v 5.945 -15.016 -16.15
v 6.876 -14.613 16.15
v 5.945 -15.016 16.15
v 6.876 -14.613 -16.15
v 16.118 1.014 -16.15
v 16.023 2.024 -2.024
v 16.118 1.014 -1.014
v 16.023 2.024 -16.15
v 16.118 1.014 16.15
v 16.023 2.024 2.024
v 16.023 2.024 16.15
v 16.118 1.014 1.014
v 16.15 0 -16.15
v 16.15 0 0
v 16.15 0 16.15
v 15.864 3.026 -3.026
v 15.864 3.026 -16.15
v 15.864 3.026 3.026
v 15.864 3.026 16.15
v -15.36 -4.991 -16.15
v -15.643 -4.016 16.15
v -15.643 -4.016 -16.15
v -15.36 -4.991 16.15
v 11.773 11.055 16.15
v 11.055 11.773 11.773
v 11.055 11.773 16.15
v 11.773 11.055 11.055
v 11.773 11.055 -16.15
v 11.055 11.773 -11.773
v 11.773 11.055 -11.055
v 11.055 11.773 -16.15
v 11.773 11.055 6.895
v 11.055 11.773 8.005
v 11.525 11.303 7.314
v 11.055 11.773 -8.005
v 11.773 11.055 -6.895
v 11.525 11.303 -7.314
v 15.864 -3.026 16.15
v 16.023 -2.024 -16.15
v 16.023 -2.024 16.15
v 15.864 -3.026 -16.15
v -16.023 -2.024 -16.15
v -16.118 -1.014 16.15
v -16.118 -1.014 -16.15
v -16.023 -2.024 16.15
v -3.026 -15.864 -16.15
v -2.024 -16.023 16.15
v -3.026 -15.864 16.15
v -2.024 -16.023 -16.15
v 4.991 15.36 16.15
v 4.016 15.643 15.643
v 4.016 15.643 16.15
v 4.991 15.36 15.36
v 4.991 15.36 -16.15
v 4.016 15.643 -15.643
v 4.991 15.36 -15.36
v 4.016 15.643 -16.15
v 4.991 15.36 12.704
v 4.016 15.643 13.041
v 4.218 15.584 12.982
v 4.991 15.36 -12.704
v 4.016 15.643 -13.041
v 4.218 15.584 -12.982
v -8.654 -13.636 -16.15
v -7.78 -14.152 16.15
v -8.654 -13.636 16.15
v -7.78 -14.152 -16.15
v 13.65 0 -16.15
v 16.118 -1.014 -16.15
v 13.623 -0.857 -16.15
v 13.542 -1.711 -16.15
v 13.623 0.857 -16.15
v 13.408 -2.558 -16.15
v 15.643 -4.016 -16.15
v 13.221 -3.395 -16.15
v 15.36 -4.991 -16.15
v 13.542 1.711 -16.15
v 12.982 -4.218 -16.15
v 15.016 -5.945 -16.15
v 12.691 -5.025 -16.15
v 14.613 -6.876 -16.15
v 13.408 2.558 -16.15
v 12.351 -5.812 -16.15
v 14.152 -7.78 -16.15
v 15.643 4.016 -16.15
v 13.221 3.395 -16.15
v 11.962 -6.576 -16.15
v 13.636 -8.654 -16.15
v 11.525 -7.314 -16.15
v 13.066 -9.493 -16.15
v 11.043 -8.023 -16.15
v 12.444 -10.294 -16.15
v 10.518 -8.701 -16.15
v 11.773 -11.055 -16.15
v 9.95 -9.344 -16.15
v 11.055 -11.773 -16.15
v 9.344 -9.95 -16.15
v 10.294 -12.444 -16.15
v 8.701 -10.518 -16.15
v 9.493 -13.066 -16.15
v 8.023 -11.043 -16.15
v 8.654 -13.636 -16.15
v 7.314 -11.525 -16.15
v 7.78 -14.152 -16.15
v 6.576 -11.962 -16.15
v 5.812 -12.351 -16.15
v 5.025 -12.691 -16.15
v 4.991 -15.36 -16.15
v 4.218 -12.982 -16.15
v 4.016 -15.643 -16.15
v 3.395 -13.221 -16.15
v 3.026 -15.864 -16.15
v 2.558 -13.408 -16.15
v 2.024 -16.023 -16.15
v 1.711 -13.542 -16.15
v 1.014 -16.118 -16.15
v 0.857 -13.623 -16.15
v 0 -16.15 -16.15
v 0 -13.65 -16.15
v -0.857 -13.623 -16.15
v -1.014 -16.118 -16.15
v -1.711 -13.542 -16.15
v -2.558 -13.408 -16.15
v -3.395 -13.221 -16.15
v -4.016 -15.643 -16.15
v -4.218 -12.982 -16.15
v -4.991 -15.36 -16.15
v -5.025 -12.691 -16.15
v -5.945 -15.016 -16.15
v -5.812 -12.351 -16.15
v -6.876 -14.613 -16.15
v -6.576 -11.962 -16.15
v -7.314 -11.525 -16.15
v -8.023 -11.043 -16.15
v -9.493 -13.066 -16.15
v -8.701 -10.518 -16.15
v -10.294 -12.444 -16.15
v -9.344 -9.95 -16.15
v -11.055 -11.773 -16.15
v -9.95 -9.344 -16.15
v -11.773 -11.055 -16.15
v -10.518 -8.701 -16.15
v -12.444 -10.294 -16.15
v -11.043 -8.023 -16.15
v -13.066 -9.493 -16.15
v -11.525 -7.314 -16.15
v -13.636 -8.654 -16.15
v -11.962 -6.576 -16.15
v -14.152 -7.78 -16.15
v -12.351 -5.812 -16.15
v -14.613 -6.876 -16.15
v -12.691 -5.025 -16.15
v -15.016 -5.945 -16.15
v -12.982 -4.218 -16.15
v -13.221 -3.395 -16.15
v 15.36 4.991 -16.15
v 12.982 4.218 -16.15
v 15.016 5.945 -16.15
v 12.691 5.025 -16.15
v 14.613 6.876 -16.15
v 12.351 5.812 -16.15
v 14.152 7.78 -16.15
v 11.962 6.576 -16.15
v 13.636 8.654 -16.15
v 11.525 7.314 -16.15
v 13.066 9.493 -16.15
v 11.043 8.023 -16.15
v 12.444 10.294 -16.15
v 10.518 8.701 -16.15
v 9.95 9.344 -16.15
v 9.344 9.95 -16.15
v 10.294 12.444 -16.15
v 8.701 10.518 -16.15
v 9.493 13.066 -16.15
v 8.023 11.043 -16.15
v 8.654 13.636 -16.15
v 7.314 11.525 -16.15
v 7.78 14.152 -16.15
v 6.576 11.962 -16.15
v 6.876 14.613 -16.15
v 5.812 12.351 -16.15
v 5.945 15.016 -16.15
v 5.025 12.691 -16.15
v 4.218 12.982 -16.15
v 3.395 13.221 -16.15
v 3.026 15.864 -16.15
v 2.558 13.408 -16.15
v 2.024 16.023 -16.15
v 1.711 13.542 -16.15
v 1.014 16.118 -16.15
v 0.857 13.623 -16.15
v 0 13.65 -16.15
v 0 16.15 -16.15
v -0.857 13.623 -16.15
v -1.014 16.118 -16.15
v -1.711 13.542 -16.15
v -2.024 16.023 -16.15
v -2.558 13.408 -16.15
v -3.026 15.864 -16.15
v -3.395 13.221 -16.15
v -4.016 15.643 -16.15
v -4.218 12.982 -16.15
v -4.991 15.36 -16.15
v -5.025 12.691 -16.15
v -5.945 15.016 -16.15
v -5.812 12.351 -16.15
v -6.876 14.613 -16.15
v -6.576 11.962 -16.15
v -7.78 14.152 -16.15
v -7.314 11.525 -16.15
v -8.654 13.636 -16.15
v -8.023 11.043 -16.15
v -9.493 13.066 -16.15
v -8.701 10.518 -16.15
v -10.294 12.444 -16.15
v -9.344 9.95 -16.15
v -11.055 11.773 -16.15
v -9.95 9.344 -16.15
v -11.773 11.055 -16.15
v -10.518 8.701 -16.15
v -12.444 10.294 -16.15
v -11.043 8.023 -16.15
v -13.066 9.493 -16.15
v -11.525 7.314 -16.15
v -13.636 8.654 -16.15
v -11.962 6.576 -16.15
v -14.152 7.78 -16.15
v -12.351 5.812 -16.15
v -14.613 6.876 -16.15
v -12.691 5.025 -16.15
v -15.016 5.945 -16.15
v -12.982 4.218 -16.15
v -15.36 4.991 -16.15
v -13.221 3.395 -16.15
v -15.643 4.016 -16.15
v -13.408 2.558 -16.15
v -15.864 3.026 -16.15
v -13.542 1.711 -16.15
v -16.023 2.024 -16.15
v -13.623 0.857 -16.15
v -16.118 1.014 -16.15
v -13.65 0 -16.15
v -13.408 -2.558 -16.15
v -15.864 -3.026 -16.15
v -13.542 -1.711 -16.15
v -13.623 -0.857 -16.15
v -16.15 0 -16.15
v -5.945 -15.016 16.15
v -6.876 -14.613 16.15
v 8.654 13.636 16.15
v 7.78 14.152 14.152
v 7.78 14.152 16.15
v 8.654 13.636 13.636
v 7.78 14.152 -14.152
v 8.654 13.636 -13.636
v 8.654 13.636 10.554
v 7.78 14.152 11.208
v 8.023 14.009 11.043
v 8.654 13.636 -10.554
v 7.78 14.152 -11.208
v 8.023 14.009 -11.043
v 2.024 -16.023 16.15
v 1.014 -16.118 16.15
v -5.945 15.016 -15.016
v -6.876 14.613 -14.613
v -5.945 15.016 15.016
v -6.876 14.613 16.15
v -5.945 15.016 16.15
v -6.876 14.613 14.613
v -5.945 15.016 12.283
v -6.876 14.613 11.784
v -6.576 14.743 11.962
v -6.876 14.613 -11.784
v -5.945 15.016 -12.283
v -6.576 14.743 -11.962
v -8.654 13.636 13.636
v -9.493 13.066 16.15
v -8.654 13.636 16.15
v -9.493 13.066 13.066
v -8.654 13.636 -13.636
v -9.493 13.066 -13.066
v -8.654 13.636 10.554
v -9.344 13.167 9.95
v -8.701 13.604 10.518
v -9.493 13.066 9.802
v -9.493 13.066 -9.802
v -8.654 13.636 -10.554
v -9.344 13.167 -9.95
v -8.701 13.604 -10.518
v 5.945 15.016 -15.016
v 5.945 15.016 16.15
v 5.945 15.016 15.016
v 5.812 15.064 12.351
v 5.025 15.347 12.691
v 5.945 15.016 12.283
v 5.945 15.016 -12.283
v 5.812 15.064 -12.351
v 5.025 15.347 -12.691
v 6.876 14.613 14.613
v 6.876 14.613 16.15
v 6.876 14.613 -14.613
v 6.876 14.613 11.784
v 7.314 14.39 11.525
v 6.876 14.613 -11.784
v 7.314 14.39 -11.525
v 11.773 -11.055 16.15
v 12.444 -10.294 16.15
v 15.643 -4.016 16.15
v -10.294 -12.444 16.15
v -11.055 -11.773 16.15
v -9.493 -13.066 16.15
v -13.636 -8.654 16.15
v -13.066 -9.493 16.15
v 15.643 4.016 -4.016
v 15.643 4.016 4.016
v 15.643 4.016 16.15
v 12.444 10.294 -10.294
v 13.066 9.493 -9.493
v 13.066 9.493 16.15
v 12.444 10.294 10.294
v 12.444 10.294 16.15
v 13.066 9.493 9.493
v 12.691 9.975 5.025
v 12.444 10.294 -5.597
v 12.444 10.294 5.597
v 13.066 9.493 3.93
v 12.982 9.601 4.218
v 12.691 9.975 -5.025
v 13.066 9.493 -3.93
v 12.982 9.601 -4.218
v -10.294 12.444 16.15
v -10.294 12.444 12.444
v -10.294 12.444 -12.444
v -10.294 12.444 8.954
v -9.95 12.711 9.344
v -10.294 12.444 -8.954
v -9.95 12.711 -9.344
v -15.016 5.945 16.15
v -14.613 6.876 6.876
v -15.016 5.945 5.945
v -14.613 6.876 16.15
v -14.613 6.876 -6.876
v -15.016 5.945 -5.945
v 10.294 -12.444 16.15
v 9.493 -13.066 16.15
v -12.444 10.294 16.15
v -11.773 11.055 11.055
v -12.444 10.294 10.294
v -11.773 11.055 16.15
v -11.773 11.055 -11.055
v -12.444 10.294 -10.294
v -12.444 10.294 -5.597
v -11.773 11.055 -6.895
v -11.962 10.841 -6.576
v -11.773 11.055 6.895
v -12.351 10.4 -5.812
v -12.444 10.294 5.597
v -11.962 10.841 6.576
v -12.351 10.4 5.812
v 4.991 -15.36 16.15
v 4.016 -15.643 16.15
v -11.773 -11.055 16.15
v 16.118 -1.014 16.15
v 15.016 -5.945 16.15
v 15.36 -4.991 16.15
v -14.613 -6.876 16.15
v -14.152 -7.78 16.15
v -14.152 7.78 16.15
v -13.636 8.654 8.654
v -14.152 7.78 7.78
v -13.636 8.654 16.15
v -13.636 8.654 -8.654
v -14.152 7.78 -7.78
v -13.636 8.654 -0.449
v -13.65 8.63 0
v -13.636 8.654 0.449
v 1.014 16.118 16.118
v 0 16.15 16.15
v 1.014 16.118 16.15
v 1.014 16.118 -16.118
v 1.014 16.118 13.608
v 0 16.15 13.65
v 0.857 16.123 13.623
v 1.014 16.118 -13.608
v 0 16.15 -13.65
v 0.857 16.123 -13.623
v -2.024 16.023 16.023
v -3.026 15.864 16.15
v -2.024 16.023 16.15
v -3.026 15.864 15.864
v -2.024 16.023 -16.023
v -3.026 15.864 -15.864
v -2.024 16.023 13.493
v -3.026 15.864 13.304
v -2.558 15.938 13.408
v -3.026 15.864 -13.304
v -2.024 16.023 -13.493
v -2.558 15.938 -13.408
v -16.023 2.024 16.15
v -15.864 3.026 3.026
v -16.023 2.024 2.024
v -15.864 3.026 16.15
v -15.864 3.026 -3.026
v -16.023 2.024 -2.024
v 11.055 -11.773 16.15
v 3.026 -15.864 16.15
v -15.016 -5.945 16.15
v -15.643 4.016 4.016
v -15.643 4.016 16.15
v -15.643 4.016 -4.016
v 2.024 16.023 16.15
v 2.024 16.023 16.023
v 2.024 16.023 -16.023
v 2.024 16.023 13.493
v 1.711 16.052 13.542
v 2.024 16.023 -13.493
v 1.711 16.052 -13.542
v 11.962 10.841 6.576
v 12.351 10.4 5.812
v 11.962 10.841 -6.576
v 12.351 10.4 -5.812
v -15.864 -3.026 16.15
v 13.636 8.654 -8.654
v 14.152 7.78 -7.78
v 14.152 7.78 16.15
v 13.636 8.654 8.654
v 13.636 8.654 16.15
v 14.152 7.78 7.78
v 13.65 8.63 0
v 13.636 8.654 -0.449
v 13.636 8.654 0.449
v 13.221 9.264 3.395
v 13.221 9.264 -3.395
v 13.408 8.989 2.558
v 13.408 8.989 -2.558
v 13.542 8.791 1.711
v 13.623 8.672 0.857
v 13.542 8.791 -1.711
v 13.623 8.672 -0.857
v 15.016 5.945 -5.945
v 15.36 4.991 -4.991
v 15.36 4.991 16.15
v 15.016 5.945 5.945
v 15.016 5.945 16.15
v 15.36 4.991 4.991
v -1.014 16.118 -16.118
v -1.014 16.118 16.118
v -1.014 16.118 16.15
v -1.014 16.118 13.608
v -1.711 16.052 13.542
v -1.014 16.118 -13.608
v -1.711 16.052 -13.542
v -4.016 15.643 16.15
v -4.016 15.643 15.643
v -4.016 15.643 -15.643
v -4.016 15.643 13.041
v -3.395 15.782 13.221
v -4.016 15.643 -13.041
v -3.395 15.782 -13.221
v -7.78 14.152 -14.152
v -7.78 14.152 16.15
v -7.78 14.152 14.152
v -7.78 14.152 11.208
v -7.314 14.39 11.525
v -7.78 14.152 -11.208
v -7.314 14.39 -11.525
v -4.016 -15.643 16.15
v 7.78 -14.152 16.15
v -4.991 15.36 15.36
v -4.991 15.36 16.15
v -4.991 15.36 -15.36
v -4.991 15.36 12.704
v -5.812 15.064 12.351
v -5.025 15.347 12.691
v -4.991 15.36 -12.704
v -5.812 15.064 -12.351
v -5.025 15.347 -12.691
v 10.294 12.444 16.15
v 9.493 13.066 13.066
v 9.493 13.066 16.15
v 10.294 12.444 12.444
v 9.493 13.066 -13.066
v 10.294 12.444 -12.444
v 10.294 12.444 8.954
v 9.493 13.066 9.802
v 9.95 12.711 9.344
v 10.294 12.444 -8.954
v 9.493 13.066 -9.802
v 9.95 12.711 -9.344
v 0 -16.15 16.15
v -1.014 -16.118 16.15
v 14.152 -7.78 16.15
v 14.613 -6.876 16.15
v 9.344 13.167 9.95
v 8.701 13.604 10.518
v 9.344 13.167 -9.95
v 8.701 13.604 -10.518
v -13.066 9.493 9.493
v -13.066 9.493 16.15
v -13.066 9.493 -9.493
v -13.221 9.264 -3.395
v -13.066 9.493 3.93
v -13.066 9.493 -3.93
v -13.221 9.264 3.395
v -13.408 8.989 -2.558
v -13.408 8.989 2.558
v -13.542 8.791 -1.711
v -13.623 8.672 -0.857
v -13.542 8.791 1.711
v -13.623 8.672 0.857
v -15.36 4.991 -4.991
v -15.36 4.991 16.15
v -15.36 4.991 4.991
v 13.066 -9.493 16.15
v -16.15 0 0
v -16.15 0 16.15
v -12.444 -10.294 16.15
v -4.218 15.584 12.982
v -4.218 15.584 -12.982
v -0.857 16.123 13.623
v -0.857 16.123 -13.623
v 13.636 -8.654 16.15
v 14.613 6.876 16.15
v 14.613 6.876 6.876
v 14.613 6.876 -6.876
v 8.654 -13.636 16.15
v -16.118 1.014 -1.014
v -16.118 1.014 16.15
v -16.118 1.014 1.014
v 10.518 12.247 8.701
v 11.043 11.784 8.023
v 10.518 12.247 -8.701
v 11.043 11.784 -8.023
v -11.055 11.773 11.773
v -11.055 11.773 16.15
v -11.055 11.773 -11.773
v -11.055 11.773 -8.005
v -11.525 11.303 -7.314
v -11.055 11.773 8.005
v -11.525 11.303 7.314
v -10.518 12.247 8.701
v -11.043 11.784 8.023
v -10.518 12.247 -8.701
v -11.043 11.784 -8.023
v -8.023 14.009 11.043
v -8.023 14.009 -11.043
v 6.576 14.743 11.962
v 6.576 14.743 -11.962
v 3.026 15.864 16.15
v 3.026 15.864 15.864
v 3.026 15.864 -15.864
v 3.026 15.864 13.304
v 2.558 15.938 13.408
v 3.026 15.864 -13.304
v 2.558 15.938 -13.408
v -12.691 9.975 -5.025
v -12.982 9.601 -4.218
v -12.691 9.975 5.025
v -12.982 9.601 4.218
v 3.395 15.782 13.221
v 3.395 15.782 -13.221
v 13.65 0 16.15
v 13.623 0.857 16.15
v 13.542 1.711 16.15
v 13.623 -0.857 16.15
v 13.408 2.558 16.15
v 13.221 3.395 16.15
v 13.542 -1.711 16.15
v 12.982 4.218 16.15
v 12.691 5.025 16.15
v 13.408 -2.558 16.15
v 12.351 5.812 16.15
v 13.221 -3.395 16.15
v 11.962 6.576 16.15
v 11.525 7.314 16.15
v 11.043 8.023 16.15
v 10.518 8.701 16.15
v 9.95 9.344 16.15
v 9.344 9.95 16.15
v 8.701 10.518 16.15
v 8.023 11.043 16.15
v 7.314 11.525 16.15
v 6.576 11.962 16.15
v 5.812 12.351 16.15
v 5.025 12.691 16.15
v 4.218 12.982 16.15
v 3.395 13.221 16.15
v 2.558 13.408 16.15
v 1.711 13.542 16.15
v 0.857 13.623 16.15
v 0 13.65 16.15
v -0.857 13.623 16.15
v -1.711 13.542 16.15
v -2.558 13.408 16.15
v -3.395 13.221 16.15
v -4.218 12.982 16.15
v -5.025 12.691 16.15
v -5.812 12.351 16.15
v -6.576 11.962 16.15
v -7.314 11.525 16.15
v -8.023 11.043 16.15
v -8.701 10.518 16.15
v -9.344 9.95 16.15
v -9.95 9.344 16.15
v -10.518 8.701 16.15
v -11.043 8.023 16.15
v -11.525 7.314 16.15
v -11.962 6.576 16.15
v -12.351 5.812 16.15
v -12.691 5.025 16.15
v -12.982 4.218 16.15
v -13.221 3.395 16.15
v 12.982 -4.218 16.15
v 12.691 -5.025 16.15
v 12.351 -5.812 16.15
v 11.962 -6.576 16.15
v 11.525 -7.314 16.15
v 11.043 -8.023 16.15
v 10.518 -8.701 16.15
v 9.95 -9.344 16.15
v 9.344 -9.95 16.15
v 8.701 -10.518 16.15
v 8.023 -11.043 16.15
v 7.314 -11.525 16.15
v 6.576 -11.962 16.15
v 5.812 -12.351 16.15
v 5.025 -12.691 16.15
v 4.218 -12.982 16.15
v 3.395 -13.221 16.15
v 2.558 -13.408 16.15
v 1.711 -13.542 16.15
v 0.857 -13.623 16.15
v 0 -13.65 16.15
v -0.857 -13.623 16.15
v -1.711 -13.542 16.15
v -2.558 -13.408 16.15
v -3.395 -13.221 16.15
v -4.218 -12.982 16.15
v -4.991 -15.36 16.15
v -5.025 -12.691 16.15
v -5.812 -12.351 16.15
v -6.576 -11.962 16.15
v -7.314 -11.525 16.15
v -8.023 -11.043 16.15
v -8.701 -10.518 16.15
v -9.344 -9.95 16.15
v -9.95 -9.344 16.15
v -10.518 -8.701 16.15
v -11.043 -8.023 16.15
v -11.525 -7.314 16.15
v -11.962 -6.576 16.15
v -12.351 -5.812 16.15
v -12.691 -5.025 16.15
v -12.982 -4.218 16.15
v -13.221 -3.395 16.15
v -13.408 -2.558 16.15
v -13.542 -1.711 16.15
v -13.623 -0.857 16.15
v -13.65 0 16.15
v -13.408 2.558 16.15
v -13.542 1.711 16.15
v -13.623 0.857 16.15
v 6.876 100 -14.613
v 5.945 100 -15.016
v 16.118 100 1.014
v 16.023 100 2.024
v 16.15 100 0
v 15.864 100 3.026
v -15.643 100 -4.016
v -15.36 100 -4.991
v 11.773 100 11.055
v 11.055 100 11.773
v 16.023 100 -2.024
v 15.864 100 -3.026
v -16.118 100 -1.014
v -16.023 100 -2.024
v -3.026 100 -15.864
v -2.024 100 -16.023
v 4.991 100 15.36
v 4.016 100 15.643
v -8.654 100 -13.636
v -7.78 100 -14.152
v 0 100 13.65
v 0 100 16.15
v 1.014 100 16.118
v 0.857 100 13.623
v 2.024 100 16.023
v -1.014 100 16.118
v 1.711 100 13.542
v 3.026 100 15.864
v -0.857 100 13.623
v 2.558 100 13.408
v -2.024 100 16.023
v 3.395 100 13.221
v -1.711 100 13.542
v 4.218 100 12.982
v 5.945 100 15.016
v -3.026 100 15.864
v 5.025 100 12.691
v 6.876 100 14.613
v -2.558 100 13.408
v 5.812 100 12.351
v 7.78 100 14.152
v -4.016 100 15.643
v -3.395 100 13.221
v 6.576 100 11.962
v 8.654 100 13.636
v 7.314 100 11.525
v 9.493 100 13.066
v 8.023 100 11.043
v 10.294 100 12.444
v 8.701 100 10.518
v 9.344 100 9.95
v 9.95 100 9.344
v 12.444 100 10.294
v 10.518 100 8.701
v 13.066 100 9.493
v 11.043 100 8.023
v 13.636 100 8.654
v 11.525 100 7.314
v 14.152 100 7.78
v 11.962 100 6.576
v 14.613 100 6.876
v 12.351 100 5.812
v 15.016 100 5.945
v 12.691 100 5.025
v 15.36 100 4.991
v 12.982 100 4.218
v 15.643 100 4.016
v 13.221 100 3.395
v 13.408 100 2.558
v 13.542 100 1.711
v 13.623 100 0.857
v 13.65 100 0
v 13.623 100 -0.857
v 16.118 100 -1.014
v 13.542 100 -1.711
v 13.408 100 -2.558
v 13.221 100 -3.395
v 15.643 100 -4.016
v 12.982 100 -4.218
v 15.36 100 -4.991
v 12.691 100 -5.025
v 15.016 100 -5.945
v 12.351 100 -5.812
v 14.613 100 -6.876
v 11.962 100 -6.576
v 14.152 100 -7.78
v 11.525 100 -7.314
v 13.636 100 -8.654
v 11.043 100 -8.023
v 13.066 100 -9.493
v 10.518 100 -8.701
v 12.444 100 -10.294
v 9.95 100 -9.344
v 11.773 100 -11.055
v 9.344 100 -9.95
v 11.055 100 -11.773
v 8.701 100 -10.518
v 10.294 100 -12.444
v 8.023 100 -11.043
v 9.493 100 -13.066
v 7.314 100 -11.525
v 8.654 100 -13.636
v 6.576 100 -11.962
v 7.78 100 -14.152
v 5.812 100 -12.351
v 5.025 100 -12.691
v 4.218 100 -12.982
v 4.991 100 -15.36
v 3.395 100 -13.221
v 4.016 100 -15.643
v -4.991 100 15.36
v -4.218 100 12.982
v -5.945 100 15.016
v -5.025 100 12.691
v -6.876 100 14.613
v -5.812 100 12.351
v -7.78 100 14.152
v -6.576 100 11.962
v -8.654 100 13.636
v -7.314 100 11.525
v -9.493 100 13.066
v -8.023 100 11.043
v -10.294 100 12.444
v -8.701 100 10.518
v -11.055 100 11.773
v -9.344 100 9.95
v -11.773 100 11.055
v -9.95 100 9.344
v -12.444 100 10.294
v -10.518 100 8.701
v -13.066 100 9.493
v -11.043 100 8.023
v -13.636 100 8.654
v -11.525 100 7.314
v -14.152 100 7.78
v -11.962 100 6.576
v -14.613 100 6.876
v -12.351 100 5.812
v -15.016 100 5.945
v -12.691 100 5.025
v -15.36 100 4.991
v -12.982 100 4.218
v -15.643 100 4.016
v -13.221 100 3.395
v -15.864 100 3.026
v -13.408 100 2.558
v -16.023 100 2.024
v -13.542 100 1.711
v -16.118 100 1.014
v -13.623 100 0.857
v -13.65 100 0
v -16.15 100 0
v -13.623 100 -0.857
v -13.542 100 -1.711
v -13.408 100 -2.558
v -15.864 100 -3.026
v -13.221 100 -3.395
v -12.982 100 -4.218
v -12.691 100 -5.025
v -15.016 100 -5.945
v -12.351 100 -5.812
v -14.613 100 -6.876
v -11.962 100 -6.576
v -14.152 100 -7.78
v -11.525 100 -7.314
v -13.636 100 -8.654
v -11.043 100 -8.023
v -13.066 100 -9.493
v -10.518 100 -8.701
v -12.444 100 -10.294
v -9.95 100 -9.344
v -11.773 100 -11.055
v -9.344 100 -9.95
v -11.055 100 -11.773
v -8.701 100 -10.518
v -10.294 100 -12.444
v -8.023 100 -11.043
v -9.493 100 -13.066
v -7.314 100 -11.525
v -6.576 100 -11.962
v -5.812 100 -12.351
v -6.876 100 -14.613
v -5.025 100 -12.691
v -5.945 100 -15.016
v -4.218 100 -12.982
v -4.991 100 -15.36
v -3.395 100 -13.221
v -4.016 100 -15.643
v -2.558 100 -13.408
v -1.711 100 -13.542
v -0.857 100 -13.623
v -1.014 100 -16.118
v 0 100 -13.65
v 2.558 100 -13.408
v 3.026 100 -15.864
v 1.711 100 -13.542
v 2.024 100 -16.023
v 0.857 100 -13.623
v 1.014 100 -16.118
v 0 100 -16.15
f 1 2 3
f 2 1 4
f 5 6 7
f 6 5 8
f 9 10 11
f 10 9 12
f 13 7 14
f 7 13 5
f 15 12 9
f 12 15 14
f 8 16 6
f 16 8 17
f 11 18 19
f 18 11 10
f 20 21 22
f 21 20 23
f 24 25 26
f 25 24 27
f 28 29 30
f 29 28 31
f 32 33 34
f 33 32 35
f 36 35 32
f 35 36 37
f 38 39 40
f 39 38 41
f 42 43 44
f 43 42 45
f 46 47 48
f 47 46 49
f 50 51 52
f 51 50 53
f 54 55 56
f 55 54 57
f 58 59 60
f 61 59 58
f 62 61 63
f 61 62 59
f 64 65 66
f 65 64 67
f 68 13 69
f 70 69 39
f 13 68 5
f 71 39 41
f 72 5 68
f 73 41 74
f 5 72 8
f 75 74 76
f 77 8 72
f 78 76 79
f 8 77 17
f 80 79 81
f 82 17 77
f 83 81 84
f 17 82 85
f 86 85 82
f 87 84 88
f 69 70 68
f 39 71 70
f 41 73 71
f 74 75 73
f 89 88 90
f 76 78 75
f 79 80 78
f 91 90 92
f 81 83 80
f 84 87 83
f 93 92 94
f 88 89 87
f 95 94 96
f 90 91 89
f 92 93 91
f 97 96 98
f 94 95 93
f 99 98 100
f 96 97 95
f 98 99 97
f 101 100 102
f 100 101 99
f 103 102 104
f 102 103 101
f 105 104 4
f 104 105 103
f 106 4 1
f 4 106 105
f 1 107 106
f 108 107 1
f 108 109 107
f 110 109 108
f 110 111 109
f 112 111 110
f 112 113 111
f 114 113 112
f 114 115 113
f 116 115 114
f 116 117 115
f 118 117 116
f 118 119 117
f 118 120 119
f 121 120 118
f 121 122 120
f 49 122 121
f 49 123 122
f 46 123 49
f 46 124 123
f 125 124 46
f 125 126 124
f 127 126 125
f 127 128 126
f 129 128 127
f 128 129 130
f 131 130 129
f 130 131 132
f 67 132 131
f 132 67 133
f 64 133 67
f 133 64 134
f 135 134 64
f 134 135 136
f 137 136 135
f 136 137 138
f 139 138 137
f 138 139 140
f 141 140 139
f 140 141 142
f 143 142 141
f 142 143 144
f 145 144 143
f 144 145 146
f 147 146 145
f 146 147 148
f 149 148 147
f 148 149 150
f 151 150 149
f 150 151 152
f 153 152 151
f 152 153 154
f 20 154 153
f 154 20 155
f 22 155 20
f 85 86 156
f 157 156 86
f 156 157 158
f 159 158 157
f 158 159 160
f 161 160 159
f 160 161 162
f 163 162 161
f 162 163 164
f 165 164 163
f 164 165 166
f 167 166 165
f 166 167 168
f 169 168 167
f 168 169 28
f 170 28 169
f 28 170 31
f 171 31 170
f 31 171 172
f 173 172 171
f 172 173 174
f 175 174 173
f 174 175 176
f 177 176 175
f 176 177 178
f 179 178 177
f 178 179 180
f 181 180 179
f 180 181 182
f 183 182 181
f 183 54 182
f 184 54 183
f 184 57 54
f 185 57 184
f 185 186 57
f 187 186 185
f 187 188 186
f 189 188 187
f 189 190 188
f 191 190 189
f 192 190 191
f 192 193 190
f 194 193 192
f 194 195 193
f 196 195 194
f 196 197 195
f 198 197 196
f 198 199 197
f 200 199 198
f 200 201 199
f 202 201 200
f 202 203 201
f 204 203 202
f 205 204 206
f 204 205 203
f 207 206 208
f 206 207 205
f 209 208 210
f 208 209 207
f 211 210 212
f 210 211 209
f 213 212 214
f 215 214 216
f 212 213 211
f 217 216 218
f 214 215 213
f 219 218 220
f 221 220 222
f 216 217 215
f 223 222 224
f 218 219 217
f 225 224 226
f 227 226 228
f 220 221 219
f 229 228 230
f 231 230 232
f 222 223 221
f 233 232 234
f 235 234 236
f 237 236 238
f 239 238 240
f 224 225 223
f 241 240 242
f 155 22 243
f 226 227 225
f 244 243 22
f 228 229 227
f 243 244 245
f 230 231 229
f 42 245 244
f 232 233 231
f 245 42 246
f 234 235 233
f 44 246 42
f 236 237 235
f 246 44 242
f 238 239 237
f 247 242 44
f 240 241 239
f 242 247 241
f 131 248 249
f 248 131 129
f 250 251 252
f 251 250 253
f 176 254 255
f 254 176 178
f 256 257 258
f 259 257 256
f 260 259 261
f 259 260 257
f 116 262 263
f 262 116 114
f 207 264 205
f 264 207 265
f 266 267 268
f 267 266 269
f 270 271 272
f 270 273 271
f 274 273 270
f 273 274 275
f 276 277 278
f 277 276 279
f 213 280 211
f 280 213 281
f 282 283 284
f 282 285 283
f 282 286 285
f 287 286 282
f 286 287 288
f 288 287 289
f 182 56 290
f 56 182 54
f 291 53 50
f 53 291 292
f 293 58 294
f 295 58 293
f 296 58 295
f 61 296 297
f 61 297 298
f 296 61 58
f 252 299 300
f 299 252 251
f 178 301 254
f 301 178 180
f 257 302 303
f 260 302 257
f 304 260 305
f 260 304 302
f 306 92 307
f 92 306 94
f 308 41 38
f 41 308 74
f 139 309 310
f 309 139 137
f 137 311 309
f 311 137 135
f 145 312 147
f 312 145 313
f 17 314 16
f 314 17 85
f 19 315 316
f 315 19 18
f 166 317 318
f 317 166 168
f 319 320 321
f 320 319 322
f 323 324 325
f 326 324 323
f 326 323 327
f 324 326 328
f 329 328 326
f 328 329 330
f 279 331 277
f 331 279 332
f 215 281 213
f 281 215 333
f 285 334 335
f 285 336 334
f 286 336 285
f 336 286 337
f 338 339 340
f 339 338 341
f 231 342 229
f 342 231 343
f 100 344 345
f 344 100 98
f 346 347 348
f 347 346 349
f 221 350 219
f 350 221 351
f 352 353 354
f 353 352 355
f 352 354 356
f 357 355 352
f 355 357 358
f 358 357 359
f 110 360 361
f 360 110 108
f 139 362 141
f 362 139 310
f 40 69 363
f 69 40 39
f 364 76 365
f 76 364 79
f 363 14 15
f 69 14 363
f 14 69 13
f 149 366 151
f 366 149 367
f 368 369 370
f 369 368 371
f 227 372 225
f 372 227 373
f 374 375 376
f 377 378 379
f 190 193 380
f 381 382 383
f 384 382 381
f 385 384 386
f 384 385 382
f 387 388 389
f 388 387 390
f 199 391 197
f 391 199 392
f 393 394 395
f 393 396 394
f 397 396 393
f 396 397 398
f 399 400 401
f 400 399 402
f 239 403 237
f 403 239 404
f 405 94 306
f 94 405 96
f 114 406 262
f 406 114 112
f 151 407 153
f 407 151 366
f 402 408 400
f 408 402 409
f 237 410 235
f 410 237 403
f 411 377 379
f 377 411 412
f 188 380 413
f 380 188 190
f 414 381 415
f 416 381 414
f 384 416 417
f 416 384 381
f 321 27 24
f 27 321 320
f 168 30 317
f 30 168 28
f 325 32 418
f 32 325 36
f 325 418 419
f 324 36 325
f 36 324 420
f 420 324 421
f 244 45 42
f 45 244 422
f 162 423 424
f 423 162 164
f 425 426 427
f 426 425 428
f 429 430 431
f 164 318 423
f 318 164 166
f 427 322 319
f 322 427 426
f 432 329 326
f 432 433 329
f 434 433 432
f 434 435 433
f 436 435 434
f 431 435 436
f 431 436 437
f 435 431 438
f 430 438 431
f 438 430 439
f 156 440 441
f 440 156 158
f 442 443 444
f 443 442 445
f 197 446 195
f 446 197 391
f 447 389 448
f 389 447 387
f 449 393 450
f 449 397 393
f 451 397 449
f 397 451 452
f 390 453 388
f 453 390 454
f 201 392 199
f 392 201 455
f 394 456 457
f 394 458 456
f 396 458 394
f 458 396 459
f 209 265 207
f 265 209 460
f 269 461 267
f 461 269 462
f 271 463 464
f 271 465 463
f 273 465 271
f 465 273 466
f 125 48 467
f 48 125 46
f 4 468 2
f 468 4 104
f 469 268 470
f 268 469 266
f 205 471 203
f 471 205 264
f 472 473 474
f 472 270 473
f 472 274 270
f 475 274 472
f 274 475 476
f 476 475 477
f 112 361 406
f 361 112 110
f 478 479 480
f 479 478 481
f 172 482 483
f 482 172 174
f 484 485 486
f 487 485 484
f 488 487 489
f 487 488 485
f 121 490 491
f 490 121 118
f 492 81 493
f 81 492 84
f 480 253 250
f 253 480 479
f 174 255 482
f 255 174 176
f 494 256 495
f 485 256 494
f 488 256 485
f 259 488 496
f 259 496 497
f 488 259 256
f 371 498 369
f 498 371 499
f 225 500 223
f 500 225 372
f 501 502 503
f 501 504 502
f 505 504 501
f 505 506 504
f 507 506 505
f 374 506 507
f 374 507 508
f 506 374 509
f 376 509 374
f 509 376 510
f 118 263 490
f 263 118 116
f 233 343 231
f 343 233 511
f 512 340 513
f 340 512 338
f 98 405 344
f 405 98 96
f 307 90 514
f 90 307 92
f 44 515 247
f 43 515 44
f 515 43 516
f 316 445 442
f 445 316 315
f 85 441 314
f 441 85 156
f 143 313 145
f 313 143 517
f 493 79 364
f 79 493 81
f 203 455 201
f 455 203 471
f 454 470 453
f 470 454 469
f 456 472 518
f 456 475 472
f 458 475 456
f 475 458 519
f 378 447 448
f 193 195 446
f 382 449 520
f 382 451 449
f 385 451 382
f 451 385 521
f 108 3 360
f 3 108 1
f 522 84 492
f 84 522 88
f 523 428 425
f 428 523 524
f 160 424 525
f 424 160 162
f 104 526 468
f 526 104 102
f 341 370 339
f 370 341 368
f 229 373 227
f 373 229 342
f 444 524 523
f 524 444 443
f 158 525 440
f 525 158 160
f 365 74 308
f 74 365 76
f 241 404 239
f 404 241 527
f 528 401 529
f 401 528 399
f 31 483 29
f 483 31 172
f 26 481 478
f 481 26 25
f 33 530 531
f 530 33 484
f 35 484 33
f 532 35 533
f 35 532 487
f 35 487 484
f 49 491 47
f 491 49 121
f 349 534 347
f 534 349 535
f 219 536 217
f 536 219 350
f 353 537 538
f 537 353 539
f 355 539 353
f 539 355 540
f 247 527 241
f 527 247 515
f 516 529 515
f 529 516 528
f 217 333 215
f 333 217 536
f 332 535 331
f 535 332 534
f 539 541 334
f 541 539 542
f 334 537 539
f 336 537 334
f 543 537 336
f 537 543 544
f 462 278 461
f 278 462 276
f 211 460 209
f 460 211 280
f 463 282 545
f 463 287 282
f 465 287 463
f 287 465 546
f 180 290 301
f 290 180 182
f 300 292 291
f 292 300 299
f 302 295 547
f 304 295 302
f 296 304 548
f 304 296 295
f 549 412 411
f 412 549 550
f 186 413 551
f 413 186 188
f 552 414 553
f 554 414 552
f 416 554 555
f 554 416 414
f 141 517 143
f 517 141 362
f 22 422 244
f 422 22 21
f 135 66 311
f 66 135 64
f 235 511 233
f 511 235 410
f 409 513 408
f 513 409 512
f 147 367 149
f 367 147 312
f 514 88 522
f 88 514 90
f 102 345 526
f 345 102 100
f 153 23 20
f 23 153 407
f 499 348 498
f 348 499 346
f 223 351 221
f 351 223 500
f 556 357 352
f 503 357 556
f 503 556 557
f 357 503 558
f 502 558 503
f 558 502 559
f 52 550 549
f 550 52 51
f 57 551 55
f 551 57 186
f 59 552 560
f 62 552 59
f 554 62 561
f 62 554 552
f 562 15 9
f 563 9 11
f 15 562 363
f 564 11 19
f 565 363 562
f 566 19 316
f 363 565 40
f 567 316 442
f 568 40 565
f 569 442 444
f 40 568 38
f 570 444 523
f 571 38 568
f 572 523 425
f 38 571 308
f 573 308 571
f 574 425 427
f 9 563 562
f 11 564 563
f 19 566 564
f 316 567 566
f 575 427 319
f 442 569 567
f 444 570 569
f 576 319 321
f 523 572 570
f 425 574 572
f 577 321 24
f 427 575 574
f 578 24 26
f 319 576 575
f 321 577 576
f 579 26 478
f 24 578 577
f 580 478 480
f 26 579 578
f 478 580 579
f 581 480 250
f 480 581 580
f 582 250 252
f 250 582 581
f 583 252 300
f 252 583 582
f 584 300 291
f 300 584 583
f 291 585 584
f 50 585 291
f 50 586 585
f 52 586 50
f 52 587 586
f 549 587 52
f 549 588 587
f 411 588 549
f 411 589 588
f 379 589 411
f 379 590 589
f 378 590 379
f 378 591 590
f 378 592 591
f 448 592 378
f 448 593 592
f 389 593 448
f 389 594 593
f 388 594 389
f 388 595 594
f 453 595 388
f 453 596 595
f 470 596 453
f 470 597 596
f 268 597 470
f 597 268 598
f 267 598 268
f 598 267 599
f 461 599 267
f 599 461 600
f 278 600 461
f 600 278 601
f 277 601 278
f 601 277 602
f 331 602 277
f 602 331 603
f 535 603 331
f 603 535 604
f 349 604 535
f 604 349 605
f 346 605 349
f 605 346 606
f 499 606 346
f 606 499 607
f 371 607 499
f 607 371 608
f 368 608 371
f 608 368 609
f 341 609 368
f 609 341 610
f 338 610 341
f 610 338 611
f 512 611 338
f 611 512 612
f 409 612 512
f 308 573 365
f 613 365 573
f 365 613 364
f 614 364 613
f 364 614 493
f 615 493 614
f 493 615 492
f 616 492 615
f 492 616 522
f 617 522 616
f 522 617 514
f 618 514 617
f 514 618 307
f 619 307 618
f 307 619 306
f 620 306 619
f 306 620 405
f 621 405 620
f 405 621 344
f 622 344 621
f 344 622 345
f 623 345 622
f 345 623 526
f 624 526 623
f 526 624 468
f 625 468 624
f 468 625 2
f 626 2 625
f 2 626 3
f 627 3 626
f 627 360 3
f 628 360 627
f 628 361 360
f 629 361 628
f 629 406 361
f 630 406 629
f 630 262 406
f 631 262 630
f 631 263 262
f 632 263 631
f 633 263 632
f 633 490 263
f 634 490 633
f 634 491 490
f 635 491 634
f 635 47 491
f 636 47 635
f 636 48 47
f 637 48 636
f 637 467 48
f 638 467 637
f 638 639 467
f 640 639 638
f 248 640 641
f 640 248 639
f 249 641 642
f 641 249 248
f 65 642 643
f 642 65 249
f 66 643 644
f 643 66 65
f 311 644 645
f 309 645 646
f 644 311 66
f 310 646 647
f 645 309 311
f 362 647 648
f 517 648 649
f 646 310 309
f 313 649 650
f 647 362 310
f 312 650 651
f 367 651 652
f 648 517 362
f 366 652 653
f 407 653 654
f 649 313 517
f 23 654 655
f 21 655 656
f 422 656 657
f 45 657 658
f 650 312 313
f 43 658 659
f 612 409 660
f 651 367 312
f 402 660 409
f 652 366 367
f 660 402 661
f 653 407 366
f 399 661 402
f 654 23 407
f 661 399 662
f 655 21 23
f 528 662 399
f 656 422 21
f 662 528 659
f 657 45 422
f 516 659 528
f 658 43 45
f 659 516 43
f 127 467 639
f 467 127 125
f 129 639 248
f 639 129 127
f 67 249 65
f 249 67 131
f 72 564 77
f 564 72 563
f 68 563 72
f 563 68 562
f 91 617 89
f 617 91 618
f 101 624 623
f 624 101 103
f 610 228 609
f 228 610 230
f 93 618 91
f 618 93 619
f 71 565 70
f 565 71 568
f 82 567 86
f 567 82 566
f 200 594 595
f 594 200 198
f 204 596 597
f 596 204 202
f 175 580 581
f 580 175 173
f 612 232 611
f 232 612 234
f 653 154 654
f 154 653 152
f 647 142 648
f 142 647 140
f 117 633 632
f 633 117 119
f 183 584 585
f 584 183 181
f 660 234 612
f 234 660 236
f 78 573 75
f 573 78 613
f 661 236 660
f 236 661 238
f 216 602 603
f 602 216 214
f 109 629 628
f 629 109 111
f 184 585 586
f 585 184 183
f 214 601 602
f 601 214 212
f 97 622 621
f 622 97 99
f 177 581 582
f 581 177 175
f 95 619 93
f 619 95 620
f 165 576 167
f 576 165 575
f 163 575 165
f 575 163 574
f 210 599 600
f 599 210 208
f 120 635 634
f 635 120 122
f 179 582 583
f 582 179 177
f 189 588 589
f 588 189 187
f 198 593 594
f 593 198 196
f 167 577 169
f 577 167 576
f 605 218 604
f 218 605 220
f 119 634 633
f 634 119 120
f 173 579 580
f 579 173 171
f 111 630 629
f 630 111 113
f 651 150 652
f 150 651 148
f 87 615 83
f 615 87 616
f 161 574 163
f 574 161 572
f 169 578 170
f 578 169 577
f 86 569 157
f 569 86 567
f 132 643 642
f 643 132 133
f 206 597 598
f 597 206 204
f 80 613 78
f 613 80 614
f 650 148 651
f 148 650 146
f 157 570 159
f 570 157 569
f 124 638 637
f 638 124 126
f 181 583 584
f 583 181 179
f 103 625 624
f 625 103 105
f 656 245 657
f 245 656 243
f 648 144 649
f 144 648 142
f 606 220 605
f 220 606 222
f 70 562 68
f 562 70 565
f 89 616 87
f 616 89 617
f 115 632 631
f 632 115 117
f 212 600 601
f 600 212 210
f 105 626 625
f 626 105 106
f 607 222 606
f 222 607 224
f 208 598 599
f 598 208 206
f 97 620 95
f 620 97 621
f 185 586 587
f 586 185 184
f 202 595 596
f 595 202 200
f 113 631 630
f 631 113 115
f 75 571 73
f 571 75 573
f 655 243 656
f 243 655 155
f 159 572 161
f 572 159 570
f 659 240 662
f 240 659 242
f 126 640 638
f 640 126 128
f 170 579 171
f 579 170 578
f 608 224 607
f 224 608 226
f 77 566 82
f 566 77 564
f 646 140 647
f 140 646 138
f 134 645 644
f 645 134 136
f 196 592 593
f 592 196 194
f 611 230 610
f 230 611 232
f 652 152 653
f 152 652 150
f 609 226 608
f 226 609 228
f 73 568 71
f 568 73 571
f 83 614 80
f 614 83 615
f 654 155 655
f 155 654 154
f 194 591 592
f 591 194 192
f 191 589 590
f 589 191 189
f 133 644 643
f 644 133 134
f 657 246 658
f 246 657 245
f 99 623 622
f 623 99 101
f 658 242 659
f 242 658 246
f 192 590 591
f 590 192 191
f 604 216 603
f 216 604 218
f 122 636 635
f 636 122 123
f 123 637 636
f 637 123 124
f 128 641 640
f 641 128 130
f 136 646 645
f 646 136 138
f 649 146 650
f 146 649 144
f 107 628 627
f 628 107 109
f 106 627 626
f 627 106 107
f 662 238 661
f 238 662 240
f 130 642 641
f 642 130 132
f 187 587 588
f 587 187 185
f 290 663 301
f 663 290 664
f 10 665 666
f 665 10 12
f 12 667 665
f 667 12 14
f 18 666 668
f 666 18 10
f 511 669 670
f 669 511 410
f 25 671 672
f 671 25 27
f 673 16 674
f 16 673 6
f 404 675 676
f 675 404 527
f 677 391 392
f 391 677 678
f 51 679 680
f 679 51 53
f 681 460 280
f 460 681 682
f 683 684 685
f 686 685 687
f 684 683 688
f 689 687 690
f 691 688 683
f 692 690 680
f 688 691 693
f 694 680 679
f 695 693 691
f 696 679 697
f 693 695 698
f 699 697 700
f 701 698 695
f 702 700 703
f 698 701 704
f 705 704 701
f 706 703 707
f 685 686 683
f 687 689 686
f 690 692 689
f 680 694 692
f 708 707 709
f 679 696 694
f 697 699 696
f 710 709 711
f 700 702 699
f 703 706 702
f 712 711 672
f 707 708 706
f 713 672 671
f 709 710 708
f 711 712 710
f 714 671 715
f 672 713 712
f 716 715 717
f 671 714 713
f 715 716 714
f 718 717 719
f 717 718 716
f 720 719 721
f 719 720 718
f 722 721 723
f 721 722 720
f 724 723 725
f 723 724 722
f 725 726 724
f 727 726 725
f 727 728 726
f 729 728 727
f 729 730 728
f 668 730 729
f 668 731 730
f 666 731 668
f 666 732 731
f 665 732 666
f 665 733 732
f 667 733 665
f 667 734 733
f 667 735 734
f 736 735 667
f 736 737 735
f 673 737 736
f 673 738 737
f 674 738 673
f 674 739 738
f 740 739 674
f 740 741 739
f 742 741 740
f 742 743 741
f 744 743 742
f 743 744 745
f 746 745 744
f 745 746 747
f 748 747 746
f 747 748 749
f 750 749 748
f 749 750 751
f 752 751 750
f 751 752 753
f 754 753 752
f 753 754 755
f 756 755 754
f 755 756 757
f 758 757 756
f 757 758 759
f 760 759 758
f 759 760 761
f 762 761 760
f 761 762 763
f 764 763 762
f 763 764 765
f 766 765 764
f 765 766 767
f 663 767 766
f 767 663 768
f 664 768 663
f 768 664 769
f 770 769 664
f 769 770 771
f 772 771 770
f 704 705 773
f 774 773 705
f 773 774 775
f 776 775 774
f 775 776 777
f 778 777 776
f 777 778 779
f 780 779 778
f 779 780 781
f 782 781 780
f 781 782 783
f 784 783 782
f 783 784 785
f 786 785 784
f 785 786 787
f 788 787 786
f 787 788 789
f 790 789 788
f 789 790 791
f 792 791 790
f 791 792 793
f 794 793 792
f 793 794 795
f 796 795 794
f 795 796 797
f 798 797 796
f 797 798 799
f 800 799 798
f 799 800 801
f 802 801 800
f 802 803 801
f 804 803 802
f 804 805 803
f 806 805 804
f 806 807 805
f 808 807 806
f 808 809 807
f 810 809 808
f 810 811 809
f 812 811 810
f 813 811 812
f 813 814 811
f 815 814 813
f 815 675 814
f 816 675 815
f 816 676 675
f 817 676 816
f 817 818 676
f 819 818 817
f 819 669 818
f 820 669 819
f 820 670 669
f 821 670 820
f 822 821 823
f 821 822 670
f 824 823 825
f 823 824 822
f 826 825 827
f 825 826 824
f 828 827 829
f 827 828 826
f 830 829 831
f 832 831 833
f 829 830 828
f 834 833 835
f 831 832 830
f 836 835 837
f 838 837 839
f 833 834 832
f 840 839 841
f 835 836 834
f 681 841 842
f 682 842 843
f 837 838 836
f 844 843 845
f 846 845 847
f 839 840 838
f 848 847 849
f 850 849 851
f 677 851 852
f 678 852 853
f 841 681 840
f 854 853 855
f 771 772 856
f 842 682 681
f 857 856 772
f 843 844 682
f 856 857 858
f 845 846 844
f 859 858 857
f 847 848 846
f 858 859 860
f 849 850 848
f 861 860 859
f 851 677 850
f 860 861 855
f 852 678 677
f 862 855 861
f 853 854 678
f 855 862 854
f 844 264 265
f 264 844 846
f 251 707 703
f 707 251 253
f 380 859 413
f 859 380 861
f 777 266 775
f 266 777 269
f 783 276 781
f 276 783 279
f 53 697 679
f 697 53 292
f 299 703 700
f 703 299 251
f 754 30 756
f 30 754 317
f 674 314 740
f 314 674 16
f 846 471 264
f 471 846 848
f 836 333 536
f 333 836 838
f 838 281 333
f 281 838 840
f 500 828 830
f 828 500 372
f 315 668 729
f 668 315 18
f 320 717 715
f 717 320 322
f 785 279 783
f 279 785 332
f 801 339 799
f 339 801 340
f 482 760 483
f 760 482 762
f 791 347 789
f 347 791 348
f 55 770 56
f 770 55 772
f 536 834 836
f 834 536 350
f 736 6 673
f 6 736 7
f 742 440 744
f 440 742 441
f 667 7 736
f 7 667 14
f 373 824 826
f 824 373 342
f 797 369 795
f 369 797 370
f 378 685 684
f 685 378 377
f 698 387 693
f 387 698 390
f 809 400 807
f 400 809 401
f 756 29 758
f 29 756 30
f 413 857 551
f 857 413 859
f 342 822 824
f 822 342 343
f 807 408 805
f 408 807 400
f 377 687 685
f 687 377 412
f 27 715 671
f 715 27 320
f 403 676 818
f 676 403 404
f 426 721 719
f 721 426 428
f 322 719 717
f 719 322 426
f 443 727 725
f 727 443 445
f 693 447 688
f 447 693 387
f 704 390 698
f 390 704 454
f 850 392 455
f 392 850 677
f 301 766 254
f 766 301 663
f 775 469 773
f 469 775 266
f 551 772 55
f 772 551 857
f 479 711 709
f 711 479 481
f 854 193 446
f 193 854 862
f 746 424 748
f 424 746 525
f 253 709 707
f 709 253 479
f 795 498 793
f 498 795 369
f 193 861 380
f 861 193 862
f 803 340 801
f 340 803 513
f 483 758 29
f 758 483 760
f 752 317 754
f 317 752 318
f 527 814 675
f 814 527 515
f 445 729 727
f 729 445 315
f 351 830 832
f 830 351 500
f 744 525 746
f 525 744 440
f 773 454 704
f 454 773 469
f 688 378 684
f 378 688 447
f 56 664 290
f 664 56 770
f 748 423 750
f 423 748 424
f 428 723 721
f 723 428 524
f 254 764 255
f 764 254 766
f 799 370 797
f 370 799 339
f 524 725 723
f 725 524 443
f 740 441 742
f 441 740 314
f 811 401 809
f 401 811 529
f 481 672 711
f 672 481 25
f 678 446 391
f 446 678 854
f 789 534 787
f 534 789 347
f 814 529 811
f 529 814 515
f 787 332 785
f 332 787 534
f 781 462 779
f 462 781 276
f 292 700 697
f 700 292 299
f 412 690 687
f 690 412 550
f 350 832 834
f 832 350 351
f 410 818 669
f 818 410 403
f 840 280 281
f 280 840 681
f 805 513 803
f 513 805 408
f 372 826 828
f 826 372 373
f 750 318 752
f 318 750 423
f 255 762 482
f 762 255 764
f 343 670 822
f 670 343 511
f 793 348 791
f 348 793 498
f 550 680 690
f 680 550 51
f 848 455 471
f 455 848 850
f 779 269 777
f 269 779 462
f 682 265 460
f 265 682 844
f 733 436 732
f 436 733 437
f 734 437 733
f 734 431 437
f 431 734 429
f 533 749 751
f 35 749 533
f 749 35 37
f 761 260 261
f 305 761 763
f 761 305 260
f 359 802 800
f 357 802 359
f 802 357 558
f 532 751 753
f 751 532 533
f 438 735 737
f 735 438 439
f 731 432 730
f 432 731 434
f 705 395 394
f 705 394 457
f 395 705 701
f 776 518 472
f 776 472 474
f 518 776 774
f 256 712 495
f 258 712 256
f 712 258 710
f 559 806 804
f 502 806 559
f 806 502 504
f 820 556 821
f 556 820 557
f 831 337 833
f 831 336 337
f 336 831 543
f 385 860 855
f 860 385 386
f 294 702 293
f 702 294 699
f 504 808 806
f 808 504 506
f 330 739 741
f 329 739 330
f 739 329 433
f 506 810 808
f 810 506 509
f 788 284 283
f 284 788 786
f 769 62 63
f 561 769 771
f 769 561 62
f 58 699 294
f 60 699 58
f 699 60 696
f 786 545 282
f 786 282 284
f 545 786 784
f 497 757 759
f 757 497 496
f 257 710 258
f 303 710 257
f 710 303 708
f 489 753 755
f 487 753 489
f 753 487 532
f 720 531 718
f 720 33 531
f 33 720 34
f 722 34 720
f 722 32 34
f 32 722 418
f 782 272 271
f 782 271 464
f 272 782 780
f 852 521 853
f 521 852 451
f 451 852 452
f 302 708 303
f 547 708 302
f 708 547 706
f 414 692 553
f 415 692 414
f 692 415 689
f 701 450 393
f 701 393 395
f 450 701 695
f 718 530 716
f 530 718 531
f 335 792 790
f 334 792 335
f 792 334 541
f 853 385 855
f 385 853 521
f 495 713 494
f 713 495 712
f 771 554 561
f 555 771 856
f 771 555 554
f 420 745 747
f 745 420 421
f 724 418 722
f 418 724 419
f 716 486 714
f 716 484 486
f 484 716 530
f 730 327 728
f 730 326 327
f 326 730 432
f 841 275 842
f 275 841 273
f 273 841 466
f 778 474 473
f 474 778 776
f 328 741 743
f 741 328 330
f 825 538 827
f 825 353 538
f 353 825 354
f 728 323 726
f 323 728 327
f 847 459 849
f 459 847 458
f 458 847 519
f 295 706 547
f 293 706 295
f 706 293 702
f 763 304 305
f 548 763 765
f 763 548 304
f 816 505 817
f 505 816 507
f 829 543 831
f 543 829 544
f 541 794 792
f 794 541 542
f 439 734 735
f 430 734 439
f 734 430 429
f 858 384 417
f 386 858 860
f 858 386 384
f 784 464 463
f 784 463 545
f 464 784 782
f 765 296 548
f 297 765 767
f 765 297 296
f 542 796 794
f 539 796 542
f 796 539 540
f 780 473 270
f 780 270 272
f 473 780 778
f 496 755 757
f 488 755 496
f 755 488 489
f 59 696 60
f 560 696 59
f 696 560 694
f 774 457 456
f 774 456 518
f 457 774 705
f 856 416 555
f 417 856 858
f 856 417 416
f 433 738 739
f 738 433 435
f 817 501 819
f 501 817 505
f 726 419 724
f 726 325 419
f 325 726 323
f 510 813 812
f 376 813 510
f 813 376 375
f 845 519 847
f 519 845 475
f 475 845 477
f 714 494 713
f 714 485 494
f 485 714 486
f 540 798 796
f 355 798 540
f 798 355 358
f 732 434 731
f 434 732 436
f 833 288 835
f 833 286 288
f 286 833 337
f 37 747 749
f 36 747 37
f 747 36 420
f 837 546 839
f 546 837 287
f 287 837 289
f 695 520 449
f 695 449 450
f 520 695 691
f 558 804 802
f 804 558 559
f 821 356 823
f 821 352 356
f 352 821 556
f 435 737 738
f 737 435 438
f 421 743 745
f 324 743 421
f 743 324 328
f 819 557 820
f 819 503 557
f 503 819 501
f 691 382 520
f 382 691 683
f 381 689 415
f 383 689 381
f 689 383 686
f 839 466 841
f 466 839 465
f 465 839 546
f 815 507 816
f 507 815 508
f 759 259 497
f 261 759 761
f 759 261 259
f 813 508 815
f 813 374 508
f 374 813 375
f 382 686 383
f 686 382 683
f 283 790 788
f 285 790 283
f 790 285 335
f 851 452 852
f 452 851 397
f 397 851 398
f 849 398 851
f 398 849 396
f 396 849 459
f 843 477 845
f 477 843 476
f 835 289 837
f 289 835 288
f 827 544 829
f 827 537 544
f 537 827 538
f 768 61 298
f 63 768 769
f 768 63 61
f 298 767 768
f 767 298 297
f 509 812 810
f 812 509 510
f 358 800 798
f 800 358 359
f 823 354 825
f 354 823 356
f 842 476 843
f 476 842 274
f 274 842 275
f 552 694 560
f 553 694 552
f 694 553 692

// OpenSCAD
inner_diameter=27.3; // 26.64;
outer_diameter=inner_diameter+5;
handle_length = 100;

// intersection() {
  
  difference() {
    cylinder(h=outer_diameter, d=outer_diameter, center=true, $fn=100);
    cylinder(h=outer_diameter, d=inner_diameter, center=true, $fn=100);
  }

  difference() {
    translate([0,handle_length/2,0]) {
      rotate([90,0,0]) {
        difference() {
          cylinder(h=handle_length, d=inner_diameter+5, center=true, $fn=100);
          cylinder(h=handle_length, d=inner_diameter, center=true, $fn=100);
        }
      }
    }
    cylinder(h=outer_diameter, d=outer_diameter, center=true, $fn=100);
  }
// }
